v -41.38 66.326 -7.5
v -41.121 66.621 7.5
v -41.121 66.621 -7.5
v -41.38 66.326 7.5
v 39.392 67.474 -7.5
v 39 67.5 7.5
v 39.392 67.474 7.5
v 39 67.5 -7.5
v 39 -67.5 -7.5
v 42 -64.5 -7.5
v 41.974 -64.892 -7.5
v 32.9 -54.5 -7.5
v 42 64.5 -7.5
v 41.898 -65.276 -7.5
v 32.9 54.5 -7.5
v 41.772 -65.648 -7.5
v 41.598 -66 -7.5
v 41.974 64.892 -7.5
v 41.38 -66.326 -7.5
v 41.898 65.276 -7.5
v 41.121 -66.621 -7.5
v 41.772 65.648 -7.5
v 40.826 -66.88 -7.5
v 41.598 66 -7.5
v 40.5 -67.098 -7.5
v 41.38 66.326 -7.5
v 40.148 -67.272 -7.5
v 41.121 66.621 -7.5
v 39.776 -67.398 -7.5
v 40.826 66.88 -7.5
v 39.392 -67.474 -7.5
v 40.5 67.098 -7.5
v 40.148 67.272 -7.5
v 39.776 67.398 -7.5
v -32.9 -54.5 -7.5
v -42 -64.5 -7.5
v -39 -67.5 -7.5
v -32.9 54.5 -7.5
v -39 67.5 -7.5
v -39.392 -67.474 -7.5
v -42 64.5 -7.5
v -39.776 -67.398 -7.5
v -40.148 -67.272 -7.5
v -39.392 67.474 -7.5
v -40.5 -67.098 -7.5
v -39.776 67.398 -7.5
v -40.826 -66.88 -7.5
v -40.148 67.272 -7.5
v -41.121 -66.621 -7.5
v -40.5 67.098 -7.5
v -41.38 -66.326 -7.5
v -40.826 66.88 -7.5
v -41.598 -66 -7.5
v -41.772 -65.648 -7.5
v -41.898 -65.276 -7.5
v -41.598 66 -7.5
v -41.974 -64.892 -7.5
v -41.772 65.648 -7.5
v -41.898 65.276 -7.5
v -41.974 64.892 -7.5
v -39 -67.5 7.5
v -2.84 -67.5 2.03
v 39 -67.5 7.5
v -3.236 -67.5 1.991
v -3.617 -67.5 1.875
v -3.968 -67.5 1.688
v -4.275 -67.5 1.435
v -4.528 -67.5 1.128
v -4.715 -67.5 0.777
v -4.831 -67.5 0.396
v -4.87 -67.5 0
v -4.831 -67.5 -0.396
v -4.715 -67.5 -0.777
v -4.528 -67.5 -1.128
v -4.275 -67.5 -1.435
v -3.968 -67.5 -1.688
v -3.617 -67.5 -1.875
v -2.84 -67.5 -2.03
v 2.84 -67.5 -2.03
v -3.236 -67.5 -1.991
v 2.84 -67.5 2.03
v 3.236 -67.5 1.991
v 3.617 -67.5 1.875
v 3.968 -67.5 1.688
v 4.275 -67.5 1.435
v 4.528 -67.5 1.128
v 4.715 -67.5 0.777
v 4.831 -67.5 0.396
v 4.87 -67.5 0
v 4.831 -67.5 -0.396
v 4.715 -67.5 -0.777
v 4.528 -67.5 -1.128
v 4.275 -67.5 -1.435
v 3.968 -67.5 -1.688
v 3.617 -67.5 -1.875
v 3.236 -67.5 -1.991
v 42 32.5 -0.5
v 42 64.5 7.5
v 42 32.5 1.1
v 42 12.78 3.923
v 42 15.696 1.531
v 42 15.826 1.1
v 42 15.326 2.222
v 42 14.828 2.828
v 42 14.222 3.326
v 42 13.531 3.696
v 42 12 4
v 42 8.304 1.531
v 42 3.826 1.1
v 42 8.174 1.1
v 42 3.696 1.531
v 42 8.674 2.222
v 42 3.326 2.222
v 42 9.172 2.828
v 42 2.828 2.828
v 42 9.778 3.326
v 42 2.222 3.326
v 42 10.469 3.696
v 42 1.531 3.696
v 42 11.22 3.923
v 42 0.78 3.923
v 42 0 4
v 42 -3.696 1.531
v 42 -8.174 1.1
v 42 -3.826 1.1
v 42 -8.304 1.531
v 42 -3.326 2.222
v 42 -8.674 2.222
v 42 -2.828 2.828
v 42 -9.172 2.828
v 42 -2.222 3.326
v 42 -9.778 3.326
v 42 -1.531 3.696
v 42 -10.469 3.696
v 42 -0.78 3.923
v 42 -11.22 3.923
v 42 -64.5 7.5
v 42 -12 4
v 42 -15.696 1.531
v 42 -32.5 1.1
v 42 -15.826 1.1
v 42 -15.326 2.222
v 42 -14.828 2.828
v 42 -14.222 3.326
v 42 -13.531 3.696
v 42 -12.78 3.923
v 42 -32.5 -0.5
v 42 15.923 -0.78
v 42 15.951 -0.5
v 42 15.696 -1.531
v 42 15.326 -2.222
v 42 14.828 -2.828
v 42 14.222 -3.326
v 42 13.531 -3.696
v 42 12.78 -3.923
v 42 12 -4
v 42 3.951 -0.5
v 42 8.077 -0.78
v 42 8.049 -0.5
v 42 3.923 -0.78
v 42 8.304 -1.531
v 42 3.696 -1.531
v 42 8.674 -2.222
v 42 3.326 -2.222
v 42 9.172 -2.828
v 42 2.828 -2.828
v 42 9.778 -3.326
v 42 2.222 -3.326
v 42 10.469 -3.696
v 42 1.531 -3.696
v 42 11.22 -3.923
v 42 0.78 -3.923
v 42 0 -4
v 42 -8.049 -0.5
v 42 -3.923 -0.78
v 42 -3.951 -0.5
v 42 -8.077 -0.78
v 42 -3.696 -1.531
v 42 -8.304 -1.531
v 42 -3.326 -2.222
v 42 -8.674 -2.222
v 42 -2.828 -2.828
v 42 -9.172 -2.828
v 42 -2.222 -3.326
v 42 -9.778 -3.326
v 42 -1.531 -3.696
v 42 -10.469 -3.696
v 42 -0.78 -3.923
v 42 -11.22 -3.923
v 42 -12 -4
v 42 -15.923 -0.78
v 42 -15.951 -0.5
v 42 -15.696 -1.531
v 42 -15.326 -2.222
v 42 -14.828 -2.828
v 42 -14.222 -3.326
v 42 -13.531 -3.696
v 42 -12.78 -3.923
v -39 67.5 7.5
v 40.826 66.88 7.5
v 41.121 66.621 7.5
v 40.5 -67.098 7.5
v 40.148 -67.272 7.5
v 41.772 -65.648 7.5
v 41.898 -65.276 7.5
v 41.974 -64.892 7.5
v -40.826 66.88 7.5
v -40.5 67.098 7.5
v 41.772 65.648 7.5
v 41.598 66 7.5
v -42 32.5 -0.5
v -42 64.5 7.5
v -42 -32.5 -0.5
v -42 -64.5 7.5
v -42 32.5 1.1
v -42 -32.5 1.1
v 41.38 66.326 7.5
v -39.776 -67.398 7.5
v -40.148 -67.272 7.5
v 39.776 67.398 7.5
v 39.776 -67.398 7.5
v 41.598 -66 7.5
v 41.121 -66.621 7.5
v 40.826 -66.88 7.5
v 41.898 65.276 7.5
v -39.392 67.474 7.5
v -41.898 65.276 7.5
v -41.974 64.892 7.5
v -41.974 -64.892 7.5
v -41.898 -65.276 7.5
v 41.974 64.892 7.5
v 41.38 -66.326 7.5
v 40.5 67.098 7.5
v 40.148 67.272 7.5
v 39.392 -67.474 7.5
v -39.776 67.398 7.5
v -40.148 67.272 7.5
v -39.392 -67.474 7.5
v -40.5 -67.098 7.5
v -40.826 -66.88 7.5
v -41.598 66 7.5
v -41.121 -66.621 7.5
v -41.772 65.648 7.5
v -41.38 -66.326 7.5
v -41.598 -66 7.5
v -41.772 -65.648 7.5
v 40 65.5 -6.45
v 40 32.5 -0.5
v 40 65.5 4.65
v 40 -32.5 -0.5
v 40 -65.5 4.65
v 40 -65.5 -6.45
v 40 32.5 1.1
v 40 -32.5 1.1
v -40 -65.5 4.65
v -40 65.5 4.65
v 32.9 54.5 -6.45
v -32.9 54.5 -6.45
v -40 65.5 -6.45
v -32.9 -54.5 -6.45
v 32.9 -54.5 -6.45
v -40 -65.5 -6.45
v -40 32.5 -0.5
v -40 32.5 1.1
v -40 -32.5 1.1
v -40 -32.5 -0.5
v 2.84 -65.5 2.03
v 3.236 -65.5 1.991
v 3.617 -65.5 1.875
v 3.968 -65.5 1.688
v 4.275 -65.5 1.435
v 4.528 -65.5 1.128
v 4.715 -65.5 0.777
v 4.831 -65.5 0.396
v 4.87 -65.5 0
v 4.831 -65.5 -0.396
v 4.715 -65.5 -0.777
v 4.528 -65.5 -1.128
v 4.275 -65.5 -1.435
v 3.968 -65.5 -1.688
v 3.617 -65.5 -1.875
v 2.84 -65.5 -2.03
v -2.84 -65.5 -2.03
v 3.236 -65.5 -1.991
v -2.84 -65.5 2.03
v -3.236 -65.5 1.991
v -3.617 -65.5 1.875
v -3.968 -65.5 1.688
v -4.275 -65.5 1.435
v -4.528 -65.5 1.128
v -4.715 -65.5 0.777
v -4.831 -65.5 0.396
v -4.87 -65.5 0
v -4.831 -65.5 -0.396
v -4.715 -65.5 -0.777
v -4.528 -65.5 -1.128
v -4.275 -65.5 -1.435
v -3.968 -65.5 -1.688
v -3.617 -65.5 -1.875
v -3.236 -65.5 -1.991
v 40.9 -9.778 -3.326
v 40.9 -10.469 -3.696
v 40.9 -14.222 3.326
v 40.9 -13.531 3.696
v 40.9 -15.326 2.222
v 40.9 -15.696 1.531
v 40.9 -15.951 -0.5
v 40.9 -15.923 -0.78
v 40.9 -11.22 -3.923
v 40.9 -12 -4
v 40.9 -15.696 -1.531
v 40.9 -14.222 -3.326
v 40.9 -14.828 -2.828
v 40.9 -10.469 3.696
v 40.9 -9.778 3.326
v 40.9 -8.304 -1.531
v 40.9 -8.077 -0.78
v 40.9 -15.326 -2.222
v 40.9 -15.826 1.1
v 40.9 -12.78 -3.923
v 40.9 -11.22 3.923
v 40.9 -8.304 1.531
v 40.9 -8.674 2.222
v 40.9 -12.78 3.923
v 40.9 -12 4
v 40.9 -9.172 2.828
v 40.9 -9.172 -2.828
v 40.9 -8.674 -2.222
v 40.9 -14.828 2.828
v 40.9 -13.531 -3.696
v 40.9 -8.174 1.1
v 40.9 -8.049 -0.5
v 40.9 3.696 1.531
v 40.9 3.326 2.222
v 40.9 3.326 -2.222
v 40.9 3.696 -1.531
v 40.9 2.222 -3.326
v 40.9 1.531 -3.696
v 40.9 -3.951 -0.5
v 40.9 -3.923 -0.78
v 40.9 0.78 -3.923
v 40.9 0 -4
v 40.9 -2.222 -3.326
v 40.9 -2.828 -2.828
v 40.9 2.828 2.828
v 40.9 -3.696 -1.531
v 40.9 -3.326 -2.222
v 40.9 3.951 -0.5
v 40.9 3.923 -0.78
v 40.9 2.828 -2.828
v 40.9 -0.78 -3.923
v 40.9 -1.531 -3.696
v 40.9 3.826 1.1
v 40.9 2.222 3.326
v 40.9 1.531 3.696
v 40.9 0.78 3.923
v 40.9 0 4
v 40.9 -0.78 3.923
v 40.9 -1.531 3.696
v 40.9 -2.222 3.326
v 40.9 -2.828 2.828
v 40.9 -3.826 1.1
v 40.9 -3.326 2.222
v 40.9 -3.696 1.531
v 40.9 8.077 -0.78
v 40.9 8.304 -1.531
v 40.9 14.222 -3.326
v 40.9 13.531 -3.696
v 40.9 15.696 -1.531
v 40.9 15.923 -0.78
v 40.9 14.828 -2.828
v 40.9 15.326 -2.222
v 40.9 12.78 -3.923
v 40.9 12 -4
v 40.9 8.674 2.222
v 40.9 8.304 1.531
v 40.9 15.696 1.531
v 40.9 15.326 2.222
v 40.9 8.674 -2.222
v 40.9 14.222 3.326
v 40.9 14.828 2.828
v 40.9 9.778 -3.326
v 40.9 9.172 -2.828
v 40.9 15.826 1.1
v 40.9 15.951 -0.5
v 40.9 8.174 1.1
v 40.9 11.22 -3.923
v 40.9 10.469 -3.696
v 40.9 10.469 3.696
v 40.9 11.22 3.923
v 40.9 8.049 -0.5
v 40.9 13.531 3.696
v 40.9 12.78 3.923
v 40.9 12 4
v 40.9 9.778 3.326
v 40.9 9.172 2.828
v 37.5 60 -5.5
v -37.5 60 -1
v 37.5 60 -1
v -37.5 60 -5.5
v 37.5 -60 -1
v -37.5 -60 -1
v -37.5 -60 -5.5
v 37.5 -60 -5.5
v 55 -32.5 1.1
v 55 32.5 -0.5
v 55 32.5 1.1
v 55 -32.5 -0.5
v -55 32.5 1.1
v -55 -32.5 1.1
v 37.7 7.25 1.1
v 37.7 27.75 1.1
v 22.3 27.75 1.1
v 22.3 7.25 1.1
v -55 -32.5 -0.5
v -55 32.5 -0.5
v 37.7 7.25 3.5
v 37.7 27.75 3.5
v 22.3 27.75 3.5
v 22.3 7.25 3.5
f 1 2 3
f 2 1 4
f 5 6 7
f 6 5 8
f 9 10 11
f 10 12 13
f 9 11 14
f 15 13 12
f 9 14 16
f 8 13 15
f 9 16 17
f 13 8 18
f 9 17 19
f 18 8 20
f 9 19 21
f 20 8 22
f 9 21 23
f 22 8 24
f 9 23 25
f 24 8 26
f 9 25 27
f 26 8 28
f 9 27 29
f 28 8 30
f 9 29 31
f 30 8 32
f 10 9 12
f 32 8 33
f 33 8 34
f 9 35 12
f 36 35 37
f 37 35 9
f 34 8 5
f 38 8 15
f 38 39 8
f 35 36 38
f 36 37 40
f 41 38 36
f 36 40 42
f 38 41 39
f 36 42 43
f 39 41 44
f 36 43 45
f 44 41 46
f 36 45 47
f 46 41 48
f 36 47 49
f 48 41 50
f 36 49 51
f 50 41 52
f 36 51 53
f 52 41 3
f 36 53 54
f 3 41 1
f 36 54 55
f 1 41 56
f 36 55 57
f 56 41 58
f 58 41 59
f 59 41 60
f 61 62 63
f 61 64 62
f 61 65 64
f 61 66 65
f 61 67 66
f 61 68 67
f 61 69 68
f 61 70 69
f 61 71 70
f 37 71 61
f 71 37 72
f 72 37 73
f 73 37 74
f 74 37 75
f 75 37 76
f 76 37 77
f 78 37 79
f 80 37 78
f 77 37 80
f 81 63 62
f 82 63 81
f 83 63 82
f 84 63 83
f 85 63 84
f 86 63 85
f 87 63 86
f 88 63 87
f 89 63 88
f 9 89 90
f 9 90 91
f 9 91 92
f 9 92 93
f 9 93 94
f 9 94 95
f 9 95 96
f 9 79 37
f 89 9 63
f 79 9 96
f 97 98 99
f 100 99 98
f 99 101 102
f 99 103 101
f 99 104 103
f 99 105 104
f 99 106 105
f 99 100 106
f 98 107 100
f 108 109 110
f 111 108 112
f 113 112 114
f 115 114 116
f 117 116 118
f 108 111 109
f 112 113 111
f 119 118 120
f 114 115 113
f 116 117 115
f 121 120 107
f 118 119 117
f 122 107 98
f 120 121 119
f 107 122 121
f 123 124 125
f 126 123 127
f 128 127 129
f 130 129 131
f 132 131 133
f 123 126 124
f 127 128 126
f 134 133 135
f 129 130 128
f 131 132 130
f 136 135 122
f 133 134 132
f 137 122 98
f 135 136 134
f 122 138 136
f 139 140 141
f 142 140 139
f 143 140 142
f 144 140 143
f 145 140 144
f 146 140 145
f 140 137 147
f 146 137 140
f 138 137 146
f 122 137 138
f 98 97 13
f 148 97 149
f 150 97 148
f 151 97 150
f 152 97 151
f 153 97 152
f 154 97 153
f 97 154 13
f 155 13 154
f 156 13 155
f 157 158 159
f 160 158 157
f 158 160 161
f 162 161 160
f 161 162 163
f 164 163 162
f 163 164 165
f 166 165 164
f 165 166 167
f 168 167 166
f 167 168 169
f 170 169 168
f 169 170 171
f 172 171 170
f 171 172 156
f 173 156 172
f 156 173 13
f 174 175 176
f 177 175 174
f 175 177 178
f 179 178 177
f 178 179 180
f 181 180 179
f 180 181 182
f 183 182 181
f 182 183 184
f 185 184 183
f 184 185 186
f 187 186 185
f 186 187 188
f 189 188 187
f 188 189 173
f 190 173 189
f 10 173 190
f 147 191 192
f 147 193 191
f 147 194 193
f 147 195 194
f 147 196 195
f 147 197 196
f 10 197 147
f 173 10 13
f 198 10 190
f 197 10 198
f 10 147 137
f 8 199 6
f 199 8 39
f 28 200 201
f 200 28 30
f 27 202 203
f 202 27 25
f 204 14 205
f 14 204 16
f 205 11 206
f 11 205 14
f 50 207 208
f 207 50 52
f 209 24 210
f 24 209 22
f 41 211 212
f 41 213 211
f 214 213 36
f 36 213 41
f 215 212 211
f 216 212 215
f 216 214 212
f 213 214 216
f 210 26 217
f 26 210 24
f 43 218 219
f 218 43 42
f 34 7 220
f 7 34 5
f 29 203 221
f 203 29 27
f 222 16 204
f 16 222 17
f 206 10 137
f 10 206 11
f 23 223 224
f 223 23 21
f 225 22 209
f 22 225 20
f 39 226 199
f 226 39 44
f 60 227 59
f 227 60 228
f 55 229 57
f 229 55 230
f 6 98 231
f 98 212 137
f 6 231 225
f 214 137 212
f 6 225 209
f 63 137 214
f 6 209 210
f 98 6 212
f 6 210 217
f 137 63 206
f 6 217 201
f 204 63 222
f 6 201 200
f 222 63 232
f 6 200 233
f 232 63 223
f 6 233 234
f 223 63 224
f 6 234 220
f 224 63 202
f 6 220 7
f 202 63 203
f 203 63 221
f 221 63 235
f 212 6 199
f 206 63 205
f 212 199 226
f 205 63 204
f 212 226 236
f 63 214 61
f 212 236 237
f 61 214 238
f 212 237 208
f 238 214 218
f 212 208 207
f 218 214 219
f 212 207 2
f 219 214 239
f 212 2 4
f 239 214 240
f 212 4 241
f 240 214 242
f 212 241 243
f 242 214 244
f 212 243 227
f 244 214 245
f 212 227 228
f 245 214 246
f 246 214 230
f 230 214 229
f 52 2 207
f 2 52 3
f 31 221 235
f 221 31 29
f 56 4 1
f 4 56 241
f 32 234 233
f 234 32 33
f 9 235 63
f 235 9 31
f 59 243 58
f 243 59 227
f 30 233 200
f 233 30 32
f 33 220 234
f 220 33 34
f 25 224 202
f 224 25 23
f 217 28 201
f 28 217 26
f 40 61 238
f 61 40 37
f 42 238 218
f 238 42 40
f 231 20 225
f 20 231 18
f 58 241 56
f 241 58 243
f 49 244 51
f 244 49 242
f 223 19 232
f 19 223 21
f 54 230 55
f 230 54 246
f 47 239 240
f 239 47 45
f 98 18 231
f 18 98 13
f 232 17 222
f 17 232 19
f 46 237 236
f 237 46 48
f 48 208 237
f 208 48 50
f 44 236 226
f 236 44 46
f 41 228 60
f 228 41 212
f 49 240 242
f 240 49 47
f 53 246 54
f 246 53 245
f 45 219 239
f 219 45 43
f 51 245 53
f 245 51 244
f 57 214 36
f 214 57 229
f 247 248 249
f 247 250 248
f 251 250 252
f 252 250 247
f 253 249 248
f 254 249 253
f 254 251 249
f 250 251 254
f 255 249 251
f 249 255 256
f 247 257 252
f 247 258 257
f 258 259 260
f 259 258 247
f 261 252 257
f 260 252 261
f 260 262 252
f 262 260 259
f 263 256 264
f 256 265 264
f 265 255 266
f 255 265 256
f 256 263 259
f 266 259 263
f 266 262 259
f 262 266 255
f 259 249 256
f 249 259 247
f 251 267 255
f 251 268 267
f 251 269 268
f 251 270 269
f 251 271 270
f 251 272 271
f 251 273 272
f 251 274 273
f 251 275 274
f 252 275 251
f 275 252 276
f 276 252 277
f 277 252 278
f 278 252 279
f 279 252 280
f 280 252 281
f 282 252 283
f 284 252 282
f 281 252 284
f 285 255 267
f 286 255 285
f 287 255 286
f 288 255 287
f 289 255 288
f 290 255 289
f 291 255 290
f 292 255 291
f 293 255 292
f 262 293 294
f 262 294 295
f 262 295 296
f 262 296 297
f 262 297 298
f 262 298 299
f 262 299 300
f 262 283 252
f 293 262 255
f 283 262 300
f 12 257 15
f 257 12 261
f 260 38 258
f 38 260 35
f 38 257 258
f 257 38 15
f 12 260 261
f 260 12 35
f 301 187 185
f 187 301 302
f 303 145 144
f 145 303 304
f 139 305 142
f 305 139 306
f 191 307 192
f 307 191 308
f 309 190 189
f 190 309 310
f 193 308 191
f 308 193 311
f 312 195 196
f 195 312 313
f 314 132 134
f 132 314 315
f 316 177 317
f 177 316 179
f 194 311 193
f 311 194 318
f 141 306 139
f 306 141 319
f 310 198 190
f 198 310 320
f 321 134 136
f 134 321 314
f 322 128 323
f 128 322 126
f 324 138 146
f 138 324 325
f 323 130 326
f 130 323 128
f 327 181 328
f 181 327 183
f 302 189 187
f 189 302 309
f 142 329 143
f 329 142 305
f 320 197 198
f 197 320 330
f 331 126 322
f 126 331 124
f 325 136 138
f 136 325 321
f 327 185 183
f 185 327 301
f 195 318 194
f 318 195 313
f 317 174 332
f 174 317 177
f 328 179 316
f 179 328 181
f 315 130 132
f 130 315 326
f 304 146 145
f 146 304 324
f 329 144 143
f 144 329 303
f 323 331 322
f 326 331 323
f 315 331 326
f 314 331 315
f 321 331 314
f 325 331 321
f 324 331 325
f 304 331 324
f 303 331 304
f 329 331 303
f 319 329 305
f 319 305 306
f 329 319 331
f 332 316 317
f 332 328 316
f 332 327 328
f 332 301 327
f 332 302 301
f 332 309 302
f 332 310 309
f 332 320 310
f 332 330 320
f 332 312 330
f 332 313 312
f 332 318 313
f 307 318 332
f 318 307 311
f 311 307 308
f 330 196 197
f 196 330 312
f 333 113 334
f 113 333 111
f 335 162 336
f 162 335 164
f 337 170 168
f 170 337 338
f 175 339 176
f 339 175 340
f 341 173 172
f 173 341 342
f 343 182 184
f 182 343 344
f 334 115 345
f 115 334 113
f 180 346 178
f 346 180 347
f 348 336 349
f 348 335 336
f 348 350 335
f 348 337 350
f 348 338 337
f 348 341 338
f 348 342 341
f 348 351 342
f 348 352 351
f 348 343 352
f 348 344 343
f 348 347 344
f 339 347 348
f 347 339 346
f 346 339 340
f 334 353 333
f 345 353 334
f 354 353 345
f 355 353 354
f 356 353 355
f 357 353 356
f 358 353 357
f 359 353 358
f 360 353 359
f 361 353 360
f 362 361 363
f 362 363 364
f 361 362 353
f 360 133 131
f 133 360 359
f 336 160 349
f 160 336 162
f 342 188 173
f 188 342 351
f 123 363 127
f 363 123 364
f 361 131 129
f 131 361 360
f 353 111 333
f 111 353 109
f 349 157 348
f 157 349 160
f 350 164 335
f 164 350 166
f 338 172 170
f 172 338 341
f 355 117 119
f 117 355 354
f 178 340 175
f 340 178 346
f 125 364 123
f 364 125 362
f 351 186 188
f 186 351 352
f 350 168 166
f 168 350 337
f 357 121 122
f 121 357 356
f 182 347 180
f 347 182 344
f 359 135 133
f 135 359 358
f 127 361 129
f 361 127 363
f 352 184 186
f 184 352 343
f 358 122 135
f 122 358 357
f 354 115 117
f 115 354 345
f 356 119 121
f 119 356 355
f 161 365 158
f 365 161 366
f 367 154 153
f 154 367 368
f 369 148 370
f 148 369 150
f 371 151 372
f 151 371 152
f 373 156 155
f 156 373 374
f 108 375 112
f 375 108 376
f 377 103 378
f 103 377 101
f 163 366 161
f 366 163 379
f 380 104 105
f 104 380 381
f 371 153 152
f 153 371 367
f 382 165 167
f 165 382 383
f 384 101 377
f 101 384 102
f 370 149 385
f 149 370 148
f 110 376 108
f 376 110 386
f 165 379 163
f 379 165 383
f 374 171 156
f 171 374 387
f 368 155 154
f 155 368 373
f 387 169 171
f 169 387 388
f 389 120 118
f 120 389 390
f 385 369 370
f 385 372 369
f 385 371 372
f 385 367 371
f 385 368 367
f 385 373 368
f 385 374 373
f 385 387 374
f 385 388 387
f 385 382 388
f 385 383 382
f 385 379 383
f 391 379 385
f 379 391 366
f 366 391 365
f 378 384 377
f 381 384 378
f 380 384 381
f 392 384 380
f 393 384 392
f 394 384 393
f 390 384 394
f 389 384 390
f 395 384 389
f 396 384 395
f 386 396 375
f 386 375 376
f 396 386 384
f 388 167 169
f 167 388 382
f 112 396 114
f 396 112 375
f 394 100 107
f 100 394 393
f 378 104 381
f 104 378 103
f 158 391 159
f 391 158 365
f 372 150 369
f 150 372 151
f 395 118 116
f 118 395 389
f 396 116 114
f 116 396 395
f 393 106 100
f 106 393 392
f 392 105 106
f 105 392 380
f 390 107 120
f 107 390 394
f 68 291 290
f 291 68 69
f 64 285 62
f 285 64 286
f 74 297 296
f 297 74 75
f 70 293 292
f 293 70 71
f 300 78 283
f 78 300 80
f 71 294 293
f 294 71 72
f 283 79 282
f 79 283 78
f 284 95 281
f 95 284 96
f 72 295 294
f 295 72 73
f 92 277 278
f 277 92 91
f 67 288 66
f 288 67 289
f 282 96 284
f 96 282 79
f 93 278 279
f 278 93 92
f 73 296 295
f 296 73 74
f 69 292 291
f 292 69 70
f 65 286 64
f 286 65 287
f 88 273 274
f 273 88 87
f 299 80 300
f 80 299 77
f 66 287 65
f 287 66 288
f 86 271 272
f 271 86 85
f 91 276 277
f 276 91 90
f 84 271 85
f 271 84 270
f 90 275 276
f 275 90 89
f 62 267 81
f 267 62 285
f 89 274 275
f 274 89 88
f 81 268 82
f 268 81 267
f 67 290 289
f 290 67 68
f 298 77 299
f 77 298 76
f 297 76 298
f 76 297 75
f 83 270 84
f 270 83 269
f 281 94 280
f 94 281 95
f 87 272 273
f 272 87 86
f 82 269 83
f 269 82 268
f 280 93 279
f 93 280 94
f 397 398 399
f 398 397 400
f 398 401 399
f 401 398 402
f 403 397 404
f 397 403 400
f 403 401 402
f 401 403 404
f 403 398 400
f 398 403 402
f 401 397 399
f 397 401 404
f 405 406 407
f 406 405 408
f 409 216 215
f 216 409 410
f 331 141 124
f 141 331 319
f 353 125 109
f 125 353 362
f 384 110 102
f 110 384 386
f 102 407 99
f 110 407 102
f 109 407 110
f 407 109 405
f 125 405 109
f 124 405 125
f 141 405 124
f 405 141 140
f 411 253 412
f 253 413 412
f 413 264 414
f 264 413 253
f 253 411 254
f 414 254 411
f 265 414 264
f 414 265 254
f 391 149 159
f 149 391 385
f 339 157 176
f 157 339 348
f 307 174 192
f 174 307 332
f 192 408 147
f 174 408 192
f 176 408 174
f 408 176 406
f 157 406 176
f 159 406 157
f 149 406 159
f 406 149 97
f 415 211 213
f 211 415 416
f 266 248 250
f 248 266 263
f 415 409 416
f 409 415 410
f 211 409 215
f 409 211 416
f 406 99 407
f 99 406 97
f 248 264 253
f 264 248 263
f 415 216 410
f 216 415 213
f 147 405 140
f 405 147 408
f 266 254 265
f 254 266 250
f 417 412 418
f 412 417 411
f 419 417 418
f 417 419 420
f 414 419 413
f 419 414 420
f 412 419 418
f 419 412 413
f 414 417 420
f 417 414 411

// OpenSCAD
union() {
	color(alpha = 0.9, c = "LightGray") {
		difference() {
			difference() {
				difference() {
					difference() {
						difference() {
							hull() {
								translate(v = [-39.0, -64.5, 0]) {
									cylinder($fn = 48, center = true, h = 15.0, r = 3.0);
								}
								translate(v = [-39.0, 64.5, 0]) {
									cylinder($fn = 48, center = true, h = 15.0, r = 3.0);
								}
								translate(v = [39.0, -64.5, 0]) {
									cylinder($fn = 48, center = true, h = 15.0, r = 3.0);
								}
								translate(v = [39.0, 64.5, 0]) {
									cylinder($fn = 48, center = true, h = 15.0, r = 3.0);
								}
							}
							translate(v = [0, 0, -0.9]) {
								cube(center = true, size = [80.0, 131.0, 11.1]);
							}
						}
						translate(v = [0, 0, -3.0]) {
							cube(center = true, size = [75.4, 120.4, 5.1]);
						}
					}
					translate(v = [0, 0, -6.5]) {
						cube(center = true, size = [65.8, 109.0, 2.2]);
					}
				}
				union() {
					translate(v = [42.0, -12.0, 0]) {
						rotate(a = [0, 90, 0]) {
							cylinder($fn = 32, center = true, d = 8.0, h = 2.2);
						}
					}
					translate(v = [42.0, 0.0, 0]) {
						rotate(a = [0, 90, 0]) {
							cylinder($fn = 32, center = true, d = 8.0, h = 2.2);
						}
					}
					translate(v = [42.0, 12.0, 0]) {
						rotate(a = [0, 90, 0]) {
							cylinder($fn = 32, center = true, d = 8.0, h = 2.2);
						}
					}
				}
			}
			translate(v = [0, -67.5, 0]) {
				rotate(a = [90, 0, 0]) {
					linear_extrude(center = true, height = 15.2) {
						hull() {
							translate(v = [-2.84, 0]) {
								circle($fn = 32, r = 2.0300000000000002);
							}
							translate(v = [2.84, 0]) {
								circle($fn = 32, r = 2.0300000000000002);
							}
						}
					}
				}
			}
		}
	}
	translate(v = [0, 0, -3.25]) {
		rotate(a = [0, 0, 90]) {
			union() {
				color(alpha = 0.5, c = "DodgerBlue") {
					cube(center = true, size = [120.0, 75.0, 4.5]);
				}
				color(alpha = 0.7, c = "LightBlue") {
					translate(v = [0, 0, 1.75]) {
						cube(center = true, size = [108.0, 64.8, 1.0]);
					}
				}
			}
		}
	}
	translate(v = [0, 0, 0.30000000000000004]) {
		union() {
			color(alpha = 0.5, c = "ForestGreen") {
				cube(center = true, size = [110.0, 65.0, 1.6]);
			}
			color(alpha = 0.6, c = "DarkGreen") {
				translate(v = [30.0, 17.5, 2.0]) {
					cube(center = true, size = [15.4, 20.5, 2.4]);
				}
			}
		}
	}
}
